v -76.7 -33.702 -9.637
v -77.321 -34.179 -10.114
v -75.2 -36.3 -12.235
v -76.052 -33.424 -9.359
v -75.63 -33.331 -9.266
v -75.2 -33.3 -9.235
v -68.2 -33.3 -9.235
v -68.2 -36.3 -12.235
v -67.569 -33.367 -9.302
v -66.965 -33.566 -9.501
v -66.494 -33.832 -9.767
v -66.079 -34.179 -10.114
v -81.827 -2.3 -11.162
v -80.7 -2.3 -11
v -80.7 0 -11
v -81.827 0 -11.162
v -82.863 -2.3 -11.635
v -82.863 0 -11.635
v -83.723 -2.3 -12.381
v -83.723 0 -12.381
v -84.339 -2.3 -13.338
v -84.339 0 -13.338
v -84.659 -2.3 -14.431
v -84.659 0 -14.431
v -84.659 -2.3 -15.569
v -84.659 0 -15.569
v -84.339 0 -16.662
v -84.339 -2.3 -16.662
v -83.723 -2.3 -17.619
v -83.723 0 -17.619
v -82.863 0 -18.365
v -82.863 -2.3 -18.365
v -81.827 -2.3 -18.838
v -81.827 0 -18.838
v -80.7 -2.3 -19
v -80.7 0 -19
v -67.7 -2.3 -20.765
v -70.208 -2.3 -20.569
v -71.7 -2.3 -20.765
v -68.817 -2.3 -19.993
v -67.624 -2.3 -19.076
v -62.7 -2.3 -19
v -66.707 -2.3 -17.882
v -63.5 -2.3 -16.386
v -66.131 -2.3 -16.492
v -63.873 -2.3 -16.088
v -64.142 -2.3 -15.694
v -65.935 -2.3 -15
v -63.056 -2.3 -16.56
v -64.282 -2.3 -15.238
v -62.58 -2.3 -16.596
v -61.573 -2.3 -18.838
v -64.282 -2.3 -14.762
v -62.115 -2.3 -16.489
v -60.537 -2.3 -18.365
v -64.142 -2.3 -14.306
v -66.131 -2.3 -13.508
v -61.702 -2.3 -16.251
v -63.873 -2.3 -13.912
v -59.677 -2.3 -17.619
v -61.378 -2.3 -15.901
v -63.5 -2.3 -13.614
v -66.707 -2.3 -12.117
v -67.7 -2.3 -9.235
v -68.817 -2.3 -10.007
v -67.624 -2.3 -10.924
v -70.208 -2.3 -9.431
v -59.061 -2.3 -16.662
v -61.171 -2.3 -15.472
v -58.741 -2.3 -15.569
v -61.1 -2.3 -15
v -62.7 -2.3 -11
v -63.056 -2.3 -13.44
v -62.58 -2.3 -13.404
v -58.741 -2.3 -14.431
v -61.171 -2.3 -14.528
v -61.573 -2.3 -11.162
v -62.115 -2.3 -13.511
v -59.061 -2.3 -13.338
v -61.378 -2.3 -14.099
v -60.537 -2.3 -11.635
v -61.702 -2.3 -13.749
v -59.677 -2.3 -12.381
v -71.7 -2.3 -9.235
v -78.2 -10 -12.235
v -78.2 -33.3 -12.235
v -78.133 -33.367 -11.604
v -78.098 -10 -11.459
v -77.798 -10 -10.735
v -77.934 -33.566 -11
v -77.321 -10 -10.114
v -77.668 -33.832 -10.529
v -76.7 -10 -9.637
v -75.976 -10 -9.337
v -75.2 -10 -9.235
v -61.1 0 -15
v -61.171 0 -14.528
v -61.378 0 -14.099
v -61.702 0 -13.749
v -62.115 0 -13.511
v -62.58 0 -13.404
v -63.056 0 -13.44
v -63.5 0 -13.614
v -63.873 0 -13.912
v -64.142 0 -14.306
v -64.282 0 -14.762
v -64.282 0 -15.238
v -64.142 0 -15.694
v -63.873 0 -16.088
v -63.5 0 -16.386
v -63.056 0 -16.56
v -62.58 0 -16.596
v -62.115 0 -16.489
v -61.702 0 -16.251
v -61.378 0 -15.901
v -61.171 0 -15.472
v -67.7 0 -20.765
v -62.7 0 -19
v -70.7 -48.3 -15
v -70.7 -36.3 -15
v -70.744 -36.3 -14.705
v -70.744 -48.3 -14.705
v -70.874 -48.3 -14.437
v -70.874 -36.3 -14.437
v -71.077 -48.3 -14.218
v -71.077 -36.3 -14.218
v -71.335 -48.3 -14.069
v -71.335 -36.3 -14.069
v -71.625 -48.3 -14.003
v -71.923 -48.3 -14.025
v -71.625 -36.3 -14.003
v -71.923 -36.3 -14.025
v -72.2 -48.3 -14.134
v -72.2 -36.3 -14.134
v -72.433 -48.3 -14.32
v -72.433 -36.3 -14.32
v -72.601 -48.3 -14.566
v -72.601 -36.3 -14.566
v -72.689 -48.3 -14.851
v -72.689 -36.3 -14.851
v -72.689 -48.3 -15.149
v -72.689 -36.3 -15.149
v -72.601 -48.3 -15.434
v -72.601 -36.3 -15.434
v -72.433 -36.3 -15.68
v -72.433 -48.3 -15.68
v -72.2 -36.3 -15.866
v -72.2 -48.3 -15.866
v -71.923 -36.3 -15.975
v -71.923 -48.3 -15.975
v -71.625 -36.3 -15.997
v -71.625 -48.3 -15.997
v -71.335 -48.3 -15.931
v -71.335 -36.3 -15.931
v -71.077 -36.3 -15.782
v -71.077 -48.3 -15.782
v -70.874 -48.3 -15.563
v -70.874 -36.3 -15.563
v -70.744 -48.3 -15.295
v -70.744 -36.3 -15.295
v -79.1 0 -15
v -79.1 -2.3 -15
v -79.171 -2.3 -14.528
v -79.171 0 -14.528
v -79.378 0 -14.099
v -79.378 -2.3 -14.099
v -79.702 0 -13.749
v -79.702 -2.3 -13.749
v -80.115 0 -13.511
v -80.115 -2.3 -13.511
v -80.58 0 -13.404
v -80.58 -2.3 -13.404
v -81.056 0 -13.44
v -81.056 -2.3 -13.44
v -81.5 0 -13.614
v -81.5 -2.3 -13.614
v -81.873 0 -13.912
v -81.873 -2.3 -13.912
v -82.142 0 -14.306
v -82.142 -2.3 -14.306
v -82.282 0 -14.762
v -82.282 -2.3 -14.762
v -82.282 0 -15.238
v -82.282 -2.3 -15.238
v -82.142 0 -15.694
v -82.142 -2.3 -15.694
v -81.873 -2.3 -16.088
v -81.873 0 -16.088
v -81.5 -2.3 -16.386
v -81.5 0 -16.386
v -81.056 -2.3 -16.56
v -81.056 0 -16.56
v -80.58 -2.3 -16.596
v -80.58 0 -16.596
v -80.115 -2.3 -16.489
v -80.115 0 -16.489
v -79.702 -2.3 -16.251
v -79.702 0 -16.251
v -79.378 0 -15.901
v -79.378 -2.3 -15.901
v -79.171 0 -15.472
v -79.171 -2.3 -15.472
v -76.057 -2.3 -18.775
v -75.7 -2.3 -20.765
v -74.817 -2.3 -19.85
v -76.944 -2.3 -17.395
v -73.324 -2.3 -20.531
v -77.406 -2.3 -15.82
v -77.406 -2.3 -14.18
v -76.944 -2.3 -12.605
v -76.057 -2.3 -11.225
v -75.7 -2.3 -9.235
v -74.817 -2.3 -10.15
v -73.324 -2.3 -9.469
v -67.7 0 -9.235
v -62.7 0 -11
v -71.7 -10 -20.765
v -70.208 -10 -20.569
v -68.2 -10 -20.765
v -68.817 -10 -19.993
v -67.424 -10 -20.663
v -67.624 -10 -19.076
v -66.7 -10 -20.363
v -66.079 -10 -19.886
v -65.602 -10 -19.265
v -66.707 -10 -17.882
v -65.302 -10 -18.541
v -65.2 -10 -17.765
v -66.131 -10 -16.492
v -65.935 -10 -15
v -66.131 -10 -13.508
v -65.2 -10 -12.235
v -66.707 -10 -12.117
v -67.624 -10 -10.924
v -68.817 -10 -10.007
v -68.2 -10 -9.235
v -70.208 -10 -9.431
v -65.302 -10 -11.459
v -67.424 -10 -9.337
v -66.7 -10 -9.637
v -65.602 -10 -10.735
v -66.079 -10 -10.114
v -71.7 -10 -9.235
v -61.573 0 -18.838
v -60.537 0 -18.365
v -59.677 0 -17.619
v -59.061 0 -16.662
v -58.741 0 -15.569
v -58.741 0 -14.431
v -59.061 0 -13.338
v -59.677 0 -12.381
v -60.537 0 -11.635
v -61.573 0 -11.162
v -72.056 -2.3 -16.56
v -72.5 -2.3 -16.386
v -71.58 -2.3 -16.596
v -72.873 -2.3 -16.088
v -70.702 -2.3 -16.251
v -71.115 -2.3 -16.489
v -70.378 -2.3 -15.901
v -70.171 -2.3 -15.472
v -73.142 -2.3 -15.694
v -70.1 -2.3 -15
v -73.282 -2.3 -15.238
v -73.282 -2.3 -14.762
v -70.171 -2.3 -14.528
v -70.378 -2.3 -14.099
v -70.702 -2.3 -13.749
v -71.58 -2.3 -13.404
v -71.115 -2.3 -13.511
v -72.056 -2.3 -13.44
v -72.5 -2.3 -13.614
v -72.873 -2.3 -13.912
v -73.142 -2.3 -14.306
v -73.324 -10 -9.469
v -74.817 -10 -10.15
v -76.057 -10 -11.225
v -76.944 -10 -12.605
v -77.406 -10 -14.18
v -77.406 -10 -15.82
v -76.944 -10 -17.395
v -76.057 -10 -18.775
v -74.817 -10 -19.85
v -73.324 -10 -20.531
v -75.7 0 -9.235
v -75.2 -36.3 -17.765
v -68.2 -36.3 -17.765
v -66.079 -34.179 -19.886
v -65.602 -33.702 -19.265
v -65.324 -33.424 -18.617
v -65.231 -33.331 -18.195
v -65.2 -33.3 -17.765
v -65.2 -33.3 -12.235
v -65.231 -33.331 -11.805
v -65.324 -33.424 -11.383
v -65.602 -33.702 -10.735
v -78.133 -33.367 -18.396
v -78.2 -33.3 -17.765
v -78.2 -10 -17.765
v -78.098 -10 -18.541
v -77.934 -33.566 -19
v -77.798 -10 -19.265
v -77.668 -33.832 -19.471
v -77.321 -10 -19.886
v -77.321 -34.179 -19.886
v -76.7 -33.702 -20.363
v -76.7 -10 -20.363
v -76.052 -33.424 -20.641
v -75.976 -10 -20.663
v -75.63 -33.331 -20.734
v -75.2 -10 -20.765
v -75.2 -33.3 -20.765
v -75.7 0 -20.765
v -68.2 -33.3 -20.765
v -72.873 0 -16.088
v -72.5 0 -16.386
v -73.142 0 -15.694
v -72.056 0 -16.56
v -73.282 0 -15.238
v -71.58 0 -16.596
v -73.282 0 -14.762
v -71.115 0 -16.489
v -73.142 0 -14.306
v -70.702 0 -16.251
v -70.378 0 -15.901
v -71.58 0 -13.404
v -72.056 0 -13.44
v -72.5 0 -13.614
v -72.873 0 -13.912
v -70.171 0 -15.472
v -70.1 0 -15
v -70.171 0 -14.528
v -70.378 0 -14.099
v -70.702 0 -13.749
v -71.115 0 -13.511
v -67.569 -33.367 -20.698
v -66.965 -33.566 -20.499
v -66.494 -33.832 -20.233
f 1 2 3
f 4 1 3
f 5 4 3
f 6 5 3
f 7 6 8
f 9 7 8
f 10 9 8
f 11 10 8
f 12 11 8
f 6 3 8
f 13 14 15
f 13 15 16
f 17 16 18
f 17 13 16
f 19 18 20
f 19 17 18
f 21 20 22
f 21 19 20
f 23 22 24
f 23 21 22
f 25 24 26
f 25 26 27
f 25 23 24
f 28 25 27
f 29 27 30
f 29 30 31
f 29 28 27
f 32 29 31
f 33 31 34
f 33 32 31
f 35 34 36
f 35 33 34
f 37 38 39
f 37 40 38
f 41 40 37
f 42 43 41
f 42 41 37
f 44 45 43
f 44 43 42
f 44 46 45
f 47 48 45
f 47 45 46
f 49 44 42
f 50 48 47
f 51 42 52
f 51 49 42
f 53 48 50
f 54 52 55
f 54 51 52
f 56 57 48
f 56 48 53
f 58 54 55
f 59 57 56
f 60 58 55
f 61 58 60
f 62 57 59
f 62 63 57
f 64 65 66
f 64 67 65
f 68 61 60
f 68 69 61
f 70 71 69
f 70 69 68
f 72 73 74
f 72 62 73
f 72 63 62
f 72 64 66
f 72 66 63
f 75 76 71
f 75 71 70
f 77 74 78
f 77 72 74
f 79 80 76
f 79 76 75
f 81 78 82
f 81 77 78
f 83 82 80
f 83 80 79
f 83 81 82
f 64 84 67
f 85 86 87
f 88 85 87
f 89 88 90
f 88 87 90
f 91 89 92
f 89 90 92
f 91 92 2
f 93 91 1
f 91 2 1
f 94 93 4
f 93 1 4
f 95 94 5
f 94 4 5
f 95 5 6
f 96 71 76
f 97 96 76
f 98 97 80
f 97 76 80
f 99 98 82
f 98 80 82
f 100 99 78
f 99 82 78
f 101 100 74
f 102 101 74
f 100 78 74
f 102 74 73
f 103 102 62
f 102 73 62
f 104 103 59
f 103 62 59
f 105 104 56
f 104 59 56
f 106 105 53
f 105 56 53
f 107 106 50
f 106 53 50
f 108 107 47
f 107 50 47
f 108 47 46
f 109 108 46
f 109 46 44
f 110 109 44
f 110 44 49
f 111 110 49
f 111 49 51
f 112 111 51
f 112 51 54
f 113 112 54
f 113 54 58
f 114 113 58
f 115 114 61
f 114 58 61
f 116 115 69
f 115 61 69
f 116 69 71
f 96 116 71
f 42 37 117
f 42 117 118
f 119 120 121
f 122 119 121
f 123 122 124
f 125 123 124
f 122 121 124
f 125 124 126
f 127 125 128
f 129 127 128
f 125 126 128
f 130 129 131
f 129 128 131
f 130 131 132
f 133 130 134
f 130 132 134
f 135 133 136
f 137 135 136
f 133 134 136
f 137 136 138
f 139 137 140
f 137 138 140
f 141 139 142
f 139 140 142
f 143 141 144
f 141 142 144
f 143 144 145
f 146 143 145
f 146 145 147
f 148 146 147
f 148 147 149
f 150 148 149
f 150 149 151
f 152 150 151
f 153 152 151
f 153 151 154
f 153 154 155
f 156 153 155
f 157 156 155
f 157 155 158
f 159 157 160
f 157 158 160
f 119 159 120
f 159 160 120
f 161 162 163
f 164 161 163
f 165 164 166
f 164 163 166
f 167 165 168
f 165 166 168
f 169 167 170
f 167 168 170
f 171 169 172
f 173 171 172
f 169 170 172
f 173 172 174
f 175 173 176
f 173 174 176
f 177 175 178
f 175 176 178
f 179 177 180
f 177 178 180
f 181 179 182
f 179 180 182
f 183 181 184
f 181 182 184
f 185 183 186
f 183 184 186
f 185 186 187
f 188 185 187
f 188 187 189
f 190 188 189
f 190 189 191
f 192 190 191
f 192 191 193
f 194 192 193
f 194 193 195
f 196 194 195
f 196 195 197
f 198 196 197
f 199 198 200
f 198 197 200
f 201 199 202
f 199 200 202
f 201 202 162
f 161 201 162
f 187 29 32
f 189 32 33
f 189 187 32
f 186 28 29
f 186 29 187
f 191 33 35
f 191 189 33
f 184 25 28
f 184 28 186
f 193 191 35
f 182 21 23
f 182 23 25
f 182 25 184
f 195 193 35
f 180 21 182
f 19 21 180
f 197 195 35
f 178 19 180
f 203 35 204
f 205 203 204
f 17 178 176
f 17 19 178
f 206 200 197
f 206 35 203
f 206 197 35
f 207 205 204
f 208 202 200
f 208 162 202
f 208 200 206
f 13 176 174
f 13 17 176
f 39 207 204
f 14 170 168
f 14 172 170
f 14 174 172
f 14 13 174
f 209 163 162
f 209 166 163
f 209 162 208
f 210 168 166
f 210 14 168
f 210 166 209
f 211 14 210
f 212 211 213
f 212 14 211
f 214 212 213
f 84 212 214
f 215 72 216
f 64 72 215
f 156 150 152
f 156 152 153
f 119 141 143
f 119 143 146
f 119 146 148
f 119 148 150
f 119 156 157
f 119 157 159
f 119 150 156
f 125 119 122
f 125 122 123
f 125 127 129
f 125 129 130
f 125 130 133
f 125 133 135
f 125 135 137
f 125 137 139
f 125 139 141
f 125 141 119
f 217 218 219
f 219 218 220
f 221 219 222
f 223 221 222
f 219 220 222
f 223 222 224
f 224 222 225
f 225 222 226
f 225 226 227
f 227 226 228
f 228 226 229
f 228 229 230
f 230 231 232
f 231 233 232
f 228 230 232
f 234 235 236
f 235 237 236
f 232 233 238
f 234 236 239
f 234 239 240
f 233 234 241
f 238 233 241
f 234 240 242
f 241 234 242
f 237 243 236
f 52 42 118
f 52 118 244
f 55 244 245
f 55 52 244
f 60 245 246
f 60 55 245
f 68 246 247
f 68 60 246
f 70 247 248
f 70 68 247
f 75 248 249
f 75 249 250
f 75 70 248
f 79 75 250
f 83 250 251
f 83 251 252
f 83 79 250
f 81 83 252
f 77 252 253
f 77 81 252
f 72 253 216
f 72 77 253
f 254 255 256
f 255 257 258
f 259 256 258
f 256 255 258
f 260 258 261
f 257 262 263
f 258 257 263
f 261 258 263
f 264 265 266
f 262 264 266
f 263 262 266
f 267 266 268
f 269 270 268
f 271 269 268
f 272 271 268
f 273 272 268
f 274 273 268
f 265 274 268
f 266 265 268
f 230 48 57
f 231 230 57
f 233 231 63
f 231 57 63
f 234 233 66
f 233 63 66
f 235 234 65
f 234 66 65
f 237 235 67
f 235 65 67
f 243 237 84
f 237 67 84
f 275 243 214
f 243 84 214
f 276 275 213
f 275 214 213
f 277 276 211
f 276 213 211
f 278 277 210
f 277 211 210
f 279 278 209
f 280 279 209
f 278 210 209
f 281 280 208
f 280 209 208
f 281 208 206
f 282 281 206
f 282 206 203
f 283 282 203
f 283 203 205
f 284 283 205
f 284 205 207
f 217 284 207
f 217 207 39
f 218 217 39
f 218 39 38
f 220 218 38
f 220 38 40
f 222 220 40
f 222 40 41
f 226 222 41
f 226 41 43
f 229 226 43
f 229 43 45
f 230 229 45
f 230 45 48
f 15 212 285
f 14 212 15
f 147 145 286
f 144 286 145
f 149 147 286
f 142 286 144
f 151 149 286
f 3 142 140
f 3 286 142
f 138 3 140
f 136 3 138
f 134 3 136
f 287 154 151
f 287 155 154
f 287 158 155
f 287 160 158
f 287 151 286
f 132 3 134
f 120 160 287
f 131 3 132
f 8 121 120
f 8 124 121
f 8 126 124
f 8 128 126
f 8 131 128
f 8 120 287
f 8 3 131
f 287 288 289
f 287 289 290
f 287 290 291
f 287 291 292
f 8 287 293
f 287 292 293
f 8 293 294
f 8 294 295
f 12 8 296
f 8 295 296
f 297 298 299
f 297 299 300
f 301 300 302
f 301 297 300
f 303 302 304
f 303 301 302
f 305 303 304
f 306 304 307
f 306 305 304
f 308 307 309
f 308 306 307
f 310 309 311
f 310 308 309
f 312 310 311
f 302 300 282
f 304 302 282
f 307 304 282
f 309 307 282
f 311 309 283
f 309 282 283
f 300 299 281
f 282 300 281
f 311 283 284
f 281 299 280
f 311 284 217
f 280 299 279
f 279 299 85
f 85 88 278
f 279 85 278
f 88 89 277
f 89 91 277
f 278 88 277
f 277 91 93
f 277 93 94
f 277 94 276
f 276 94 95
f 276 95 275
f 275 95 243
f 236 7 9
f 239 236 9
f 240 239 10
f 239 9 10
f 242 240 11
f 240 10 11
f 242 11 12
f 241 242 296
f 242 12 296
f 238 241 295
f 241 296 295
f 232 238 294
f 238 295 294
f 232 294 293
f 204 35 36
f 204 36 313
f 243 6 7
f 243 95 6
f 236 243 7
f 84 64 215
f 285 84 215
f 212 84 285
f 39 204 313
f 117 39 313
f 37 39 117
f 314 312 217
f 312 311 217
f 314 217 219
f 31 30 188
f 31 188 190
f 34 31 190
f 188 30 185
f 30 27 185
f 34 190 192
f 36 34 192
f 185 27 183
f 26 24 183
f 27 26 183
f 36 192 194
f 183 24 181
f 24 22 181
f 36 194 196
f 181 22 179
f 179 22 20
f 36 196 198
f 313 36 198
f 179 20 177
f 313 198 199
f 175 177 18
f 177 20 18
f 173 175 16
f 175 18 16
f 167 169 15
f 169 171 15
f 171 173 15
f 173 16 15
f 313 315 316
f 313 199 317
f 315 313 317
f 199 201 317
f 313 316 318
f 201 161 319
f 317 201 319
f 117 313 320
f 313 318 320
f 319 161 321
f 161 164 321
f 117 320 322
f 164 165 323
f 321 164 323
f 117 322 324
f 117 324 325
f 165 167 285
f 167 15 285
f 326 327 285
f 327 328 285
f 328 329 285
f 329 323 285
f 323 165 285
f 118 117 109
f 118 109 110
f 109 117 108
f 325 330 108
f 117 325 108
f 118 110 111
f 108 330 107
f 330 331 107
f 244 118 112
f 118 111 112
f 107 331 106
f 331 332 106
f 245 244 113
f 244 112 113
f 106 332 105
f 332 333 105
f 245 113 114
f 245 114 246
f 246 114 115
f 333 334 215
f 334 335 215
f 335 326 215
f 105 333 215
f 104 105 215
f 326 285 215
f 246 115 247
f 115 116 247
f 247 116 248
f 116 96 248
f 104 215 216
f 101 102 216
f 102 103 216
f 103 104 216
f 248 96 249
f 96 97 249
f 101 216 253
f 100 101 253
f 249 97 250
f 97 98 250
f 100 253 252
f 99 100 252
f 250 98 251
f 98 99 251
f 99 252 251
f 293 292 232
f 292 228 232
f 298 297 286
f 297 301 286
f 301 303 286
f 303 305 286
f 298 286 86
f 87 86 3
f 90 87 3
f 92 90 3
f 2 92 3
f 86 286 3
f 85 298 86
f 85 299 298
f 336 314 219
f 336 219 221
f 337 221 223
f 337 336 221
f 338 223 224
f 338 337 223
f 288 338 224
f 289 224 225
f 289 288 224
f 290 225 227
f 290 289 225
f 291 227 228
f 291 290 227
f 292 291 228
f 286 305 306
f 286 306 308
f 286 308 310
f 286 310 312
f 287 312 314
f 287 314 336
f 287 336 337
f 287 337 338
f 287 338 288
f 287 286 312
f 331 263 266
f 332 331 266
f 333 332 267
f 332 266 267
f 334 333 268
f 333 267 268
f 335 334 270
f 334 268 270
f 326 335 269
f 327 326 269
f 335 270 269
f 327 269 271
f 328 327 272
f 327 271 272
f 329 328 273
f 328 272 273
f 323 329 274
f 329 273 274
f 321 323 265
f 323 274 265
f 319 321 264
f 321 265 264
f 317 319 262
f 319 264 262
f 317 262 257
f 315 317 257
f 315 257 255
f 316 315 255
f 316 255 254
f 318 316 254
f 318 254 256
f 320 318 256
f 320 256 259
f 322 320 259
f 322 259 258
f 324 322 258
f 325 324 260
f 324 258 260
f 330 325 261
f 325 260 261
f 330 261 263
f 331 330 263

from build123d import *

# Parameters (mm, degrees)
SKETCH1_R           = 1.6
BOSS_EXTRUDE1_DEPTH = 2.3
SKETCH2_R           = 5.765
BOSS_EXTRUDE2_DEPTH = 7.7
SKETCH3_W           = 13
SKETCH3_H           = 11.53
BOSS_EXTRUDE3_DEPTH = 26.3
SKETCH4_R           = 1
BOSS_EXTRUDE4_DEPTH = 12
CHAMFER1_SIZE       = 3
FILLET1_R           = 3


with BuildPart() as part:
    # Sketch1 → Boss-Extrude1 (new body)
    with BuildSketch(Plane.XZ.offset(2.3)):
        with BuildLine():
            Line((-75.699998599, -20.764999665), (-67.699998599, -20.764999665))
            Line((-67.699998599, -20.764999665), (-62.699998599, -18.999999665))
            ThreePointArc((-62.699998599, -18.999999665), (-58.699998599, -14.999999665), (-62.699998599, -10.999999665))
            Line((-62.699998599, -10.999999665), (-67.699998599, -9.234999665))
            Line((-67.699998599, -9.234999665), (-75.699998599, -9.234999665))
            Line((-75.699998599, -9.234999665), (-80.699998599, -10.999999665))
            ThreePointArc((-80.699998599, -10.999999665), (-84.699998599, -14.999999665), (-80.699998599, -18.999999665))
            Line((-80.699998599, -18.999999665), (-75.699998599, -20.764999665))
        make_face()
        with Locations((-62.699998599, -14.999999665)):
            Circle(SKETCH1_R, mode=Mode.SUBTRACT)
        with Locations((-71.699998599, -14.999999665)):
            Circle(SKETCH1_R, mode=Mode.SUBTRACT)
        with Locations((-80.699998599, -14.999999665)):
            Circle(SKETCH1_R, mode=Mode.SUBTRACT)
    extrude(amount=-BOSS_EXTRUDE1_DEPTH)

    # Sketch2 → Boss-Extrude2 (add)
    with BuildSketch(Plane.XZ.offset(2.3)):
        with Locations((-71.699998599, -14.999999665)):
            Circle(SKETCH2_R)
    extrude(amount=BOSS_EXTRUDE2_DEPTH)

    # Sketch3 → Boss-Extrude3 (add)
    with BuildSketch(Plane.XZ.offset(10)):
        with Locations((-71.699998599, -14.999999665)):
            Rectangle(SKETCH3_W, SKETCH3_H)
    extrude(amount=BOSS_EXTRUDE3_DEPTH)

    # Sketch4 → Boss-Extrude4 (add)
    with BuildSketch(Plane.XZ.offset(36.3)):
        with Locations((-71.699998599, -14.999999665)):
            Circle(SKETCH4_R)
    extrude(amount=BOSS_EXTRUDE4_DEPTH)

    # Chamfer1
    chamfer1_edges = [part.edges().sort_by_distance(p)[0] for p in [
        (-71.699998599, -36.3, -9.234999665),
        (-78.199998599, -36.3, -14.999999665),
        (-71.699998599, -36.3, -20.764999665),
        (-65.199998599, -36.3, -14.999999665),
    ]]
    chamfer(chamfer1_edges, length=CHAMFER1_SIZE)

    # Fillet1
    fillet1_edges = [part.edges().sort_by_distance(p)[0] for p in [
        (-78.199998599, -21.65, -20.764999665),
        (-78.199998599, -21.65, -9.234999665),
        (-65.199998599, -21.65, -9.234999665),
        (-65.199998599, -21.65, -20.764999665),
    ]]
    fillet(fillet1_edges, radius=FILLET1_R)


solid = part.part
